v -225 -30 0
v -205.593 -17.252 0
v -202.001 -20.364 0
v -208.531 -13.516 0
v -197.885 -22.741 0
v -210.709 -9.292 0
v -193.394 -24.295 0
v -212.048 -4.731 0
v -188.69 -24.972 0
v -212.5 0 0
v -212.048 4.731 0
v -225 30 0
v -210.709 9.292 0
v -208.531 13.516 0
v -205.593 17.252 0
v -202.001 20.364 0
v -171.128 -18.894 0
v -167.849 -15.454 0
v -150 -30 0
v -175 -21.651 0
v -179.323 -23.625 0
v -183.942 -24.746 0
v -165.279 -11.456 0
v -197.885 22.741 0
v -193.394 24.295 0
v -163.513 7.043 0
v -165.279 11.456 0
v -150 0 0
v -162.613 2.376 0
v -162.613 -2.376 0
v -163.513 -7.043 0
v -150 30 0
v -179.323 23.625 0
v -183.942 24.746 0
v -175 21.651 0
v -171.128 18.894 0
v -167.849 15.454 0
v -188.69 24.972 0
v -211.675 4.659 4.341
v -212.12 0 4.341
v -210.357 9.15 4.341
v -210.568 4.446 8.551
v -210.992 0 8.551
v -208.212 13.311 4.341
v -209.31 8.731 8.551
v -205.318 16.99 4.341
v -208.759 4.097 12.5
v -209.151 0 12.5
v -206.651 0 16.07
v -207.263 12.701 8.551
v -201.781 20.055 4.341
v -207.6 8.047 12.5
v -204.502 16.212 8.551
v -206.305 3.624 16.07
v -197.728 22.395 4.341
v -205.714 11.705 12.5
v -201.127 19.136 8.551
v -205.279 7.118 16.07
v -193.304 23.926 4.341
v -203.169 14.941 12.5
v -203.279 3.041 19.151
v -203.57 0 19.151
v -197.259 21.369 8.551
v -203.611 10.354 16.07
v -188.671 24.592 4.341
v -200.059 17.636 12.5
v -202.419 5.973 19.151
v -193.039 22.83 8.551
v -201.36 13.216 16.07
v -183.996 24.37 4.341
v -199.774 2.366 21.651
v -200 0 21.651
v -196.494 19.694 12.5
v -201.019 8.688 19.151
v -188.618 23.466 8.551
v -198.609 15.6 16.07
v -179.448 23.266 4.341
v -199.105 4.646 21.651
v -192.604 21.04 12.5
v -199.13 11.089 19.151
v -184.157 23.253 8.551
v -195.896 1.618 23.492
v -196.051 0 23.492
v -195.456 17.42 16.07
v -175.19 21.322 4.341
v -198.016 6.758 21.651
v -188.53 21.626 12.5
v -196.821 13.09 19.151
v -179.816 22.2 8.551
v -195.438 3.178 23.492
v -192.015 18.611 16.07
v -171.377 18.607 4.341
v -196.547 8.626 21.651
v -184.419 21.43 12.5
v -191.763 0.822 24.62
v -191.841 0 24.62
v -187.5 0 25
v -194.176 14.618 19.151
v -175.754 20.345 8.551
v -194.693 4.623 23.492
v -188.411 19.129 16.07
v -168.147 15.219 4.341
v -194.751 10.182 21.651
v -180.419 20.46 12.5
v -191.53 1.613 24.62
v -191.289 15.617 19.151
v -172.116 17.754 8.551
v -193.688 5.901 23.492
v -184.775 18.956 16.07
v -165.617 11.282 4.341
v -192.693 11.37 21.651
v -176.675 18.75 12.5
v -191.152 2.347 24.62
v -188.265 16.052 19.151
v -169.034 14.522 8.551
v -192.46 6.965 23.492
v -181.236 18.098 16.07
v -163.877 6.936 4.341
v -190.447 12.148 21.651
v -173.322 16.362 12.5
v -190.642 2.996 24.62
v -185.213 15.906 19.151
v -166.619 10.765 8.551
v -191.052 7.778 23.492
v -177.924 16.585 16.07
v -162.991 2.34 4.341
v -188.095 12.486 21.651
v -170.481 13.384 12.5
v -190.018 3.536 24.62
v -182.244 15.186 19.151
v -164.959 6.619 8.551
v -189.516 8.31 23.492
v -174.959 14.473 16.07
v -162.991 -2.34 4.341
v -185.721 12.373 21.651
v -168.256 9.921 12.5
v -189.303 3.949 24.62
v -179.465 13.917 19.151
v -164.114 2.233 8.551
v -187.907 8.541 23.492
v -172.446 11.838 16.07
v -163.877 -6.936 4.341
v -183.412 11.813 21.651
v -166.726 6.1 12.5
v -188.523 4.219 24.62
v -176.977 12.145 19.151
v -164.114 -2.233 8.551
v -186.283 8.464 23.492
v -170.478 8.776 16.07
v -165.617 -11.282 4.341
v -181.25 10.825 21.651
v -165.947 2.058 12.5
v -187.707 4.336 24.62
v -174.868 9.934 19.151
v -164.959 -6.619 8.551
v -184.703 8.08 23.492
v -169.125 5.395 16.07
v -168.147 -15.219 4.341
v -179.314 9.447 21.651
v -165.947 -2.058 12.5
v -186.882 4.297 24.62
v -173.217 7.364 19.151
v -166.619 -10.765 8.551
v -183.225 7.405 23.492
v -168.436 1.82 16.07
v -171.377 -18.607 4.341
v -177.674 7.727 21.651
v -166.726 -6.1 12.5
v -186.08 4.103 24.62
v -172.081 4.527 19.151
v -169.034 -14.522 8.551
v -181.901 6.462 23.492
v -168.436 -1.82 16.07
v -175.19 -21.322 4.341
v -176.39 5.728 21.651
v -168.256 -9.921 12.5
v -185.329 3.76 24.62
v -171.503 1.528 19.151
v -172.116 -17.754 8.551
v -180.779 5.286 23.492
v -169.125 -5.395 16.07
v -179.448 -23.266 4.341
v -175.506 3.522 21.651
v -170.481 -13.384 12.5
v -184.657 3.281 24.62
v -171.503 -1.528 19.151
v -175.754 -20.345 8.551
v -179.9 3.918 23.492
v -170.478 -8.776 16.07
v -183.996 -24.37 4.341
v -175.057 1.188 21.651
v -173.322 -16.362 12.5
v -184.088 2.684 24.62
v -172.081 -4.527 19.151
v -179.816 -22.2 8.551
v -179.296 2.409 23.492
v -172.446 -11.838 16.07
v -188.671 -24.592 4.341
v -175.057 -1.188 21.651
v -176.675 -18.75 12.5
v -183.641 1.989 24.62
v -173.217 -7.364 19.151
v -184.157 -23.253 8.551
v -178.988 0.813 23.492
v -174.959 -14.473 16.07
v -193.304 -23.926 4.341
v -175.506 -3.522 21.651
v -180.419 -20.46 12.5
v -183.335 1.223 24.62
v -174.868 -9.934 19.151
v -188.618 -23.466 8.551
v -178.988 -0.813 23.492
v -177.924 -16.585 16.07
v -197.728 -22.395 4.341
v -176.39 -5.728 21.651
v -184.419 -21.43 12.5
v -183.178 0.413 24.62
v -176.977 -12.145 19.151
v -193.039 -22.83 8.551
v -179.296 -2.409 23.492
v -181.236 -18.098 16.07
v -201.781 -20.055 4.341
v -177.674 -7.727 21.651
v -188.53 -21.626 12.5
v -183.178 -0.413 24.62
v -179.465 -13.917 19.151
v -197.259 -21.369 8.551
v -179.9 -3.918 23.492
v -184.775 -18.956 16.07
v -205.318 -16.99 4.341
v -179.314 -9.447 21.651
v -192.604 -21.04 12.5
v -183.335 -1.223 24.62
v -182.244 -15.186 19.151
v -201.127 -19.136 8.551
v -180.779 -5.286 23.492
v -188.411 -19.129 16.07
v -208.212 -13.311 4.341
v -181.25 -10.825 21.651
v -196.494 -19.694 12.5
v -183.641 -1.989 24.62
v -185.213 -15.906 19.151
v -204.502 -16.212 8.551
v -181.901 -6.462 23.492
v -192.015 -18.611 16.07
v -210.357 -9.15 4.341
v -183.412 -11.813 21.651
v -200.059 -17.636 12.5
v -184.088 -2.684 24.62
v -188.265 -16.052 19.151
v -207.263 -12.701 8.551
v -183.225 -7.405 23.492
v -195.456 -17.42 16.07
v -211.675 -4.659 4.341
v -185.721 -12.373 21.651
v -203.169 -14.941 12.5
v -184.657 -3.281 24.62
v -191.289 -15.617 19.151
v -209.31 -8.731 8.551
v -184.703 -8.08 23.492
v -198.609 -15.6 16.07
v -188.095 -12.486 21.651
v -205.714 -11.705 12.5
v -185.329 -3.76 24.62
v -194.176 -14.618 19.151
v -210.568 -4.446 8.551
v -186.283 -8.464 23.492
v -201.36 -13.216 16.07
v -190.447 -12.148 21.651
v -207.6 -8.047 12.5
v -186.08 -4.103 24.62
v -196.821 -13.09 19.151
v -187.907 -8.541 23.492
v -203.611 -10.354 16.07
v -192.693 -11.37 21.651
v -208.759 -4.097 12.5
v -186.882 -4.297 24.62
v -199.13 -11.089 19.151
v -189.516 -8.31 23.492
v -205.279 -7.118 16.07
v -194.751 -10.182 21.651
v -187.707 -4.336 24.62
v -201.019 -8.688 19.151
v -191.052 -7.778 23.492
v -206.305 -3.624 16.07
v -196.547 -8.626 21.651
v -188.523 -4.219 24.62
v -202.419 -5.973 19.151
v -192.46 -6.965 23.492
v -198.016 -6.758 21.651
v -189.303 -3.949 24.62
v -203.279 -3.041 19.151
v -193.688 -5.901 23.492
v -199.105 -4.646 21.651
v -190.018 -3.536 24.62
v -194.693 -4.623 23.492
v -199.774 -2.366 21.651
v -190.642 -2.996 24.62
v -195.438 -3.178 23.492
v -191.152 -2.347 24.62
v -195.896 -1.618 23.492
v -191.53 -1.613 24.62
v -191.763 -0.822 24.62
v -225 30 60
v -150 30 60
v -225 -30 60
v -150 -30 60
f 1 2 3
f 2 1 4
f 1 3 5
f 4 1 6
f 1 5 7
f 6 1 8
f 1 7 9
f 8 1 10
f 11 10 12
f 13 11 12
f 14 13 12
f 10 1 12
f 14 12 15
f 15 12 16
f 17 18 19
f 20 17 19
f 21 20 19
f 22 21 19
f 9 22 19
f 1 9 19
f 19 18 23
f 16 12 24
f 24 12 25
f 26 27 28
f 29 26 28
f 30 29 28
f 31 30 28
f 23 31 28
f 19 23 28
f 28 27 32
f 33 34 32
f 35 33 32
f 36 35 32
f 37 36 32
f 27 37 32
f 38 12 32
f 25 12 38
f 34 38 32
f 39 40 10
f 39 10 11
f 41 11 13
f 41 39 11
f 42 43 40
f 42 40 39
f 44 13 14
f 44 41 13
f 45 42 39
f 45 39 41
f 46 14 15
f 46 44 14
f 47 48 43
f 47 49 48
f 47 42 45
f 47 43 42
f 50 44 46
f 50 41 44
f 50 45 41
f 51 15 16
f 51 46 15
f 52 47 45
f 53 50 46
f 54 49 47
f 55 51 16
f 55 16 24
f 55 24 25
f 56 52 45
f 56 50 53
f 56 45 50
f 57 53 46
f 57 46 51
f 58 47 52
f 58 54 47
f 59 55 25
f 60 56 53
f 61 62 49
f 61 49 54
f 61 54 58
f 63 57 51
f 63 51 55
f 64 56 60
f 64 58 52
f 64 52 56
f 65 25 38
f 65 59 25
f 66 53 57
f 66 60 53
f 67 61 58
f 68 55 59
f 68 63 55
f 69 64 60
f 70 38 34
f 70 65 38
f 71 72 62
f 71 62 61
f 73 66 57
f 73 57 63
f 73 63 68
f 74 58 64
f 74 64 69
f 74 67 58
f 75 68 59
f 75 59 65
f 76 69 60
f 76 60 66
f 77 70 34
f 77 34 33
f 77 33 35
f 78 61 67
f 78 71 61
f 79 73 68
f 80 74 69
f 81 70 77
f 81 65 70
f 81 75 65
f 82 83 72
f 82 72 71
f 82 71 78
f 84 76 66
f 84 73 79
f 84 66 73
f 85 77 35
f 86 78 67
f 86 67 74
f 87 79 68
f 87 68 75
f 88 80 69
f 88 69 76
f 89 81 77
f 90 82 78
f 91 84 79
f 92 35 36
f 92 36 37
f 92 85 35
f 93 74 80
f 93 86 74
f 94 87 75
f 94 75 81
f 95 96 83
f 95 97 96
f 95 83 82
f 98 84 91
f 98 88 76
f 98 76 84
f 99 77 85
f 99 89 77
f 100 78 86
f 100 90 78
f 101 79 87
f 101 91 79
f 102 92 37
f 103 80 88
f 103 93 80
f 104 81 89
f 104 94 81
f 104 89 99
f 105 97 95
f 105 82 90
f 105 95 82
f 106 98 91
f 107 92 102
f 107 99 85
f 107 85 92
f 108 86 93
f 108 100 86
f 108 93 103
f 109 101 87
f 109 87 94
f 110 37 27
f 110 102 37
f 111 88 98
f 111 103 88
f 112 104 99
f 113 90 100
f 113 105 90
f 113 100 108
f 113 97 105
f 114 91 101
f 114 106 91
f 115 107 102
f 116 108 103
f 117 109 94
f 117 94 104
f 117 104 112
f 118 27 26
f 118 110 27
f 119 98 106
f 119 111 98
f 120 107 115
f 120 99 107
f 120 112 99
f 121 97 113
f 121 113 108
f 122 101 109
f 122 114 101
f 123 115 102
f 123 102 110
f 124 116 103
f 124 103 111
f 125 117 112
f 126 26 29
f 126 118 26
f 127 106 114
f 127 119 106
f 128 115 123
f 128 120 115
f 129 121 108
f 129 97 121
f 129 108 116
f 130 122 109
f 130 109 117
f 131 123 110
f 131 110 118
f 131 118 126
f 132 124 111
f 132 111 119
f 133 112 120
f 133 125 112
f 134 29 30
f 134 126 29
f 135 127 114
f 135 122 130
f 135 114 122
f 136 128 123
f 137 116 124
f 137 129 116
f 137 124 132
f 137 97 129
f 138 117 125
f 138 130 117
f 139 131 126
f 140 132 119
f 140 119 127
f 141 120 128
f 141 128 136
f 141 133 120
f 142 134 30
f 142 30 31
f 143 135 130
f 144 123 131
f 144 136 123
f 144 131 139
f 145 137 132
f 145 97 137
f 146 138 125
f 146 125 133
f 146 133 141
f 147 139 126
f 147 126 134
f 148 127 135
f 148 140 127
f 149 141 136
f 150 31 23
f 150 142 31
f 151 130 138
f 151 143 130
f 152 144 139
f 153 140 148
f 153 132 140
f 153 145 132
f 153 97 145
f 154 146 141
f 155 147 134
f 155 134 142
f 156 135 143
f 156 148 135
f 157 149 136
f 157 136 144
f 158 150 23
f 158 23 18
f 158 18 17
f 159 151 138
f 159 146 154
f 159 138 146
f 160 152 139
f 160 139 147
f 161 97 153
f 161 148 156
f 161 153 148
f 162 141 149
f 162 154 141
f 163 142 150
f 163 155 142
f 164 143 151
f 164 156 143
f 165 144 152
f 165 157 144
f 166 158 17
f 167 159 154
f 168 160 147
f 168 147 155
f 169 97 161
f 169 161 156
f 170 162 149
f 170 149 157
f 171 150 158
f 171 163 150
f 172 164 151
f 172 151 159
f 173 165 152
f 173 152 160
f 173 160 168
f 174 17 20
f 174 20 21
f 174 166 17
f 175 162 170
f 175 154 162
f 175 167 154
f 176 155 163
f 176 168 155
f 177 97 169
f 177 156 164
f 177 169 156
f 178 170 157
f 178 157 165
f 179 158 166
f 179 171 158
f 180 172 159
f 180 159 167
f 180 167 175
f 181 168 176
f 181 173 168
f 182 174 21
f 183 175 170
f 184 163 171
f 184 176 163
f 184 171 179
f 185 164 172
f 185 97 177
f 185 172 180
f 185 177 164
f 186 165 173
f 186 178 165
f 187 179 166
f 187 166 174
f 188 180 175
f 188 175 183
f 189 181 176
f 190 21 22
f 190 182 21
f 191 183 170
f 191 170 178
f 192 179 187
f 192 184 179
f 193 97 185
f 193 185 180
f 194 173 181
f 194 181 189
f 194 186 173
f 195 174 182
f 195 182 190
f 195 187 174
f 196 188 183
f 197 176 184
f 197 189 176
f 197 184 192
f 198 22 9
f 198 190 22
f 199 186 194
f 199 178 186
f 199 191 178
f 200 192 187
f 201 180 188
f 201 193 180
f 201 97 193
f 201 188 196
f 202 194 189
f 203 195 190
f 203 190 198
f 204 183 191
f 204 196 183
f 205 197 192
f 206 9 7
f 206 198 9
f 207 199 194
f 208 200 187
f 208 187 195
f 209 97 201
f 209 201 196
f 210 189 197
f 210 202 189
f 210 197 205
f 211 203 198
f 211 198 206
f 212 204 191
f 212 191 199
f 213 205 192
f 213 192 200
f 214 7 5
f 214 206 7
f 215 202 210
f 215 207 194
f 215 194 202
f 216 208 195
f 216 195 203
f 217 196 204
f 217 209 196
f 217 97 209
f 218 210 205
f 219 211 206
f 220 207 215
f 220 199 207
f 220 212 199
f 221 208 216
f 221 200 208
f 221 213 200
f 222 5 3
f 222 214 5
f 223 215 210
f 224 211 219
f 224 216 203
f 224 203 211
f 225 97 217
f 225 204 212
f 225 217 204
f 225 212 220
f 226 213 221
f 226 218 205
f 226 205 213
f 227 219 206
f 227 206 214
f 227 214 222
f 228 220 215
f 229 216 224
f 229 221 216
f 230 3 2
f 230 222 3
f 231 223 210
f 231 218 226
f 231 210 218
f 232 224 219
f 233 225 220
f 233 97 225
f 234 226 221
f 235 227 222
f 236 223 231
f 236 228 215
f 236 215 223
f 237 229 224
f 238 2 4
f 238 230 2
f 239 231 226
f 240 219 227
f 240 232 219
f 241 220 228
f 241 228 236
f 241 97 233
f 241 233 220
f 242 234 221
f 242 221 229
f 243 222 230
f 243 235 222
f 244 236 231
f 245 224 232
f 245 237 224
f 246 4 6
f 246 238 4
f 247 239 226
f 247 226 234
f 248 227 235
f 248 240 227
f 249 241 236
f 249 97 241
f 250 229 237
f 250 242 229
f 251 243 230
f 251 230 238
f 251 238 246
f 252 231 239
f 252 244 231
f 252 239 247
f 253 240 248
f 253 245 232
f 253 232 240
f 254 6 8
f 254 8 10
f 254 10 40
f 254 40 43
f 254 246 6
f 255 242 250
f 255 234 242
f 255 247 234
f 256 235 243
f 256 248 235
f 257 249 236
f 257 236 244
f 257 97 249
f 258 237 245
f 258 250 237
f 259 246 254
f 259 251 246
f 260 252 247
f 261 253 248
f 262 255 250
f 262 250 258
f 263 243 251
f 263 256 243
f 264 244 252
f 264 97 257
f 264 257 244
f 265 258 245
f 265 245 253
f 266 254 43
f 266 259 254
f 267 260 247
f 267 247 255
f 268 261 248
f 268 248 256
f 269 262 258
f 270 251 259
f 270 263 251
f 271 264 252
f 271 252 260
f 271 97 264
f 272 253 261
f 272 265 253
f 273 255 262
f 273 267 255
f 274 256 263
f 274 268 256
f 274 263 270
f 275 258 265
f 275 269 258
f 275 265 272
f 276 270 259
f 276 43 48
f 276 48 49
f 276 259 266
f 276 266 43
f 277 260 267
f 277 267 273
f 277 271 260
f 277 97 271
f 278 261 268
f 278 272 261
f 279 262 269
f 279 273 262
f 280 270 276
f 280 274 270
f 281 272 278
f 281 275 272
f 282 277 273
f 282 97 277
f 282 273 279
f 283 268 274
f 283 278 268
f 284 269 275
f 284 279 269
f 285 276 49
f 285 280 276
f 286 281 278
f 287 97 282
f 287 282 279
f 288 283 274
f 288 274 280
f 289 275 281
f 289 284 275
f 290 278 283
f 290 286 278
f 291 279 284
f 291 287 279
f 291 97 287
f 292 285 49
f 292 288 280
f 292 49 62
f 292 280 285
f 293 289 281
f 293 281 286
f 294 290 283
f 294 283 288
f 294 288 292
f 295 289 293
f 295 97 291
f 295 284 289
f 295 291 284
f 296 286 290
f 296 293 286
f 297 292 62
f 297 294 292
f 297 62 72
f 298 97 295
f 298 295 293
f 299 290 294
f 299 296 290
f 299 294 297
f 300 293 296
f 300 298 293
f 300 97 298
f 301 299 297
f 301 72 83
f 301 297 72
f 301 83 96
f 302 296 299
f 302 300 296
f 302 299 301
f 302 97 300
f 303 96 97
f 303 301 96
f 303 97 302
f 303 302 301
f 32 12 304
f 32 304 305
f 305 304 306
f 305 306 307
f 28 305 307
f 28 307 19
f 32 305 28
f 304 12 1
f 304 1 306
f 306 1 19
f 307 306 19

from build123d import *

# Parameters (mm, degrees)
SZKIC1_W                    = 500
SZKIC1_H                    = 60
DODANIE_WYCI_GNI_CIE1_DEPTH = 60
SZKIC2_R                    = 25
WYTNIJ_WYCI_GNI_CIE1_DEPTH  = 25
ZAOKR_GLENIE2_R             = 25
SZKIC5_W                    = 60
SZKIC5_H                    = 60
WYTNIJ_WYCI_GNI_CIE2_DEPTH  = 400
SZKIC6_W                    = 60
SZKIC6_H                    = 60
WYTNIJ_WYCI_GNI_CIE4_DEPTH  = 25


with BuildPart() as part:
    # Szkic1 → Dodanie-wyciągnięcie1 (new body)
    with BuildSketch(Plane.XY):
        Rectangle(SZKIC1_W, SZKIC1_H)
    extrude(amount=DODANIE_WYCI_GNI_CIE1_DEPTH)

    # Szkic2 → Wytnij-wyciągnięcie1 (cut)
    with BuildSketch(Plane(origin=(0, 0, 0), x_dir=(-1, 0, 0), z_dir=(0, 0, -1))):
        with Locations((-187.5, 0)):
            Circle(SZKIC2_R)
        with Locations((-125, 0)):
            Circle(SZKIC2_R)
        with Locations((-62.5, 0)):
            Circle(SZKIC2_R)
        Circle(SZKIC2_R)
        with Locations((62.5, 0)):
            Circle(SZKIC2_R)
        with Locations((125, 0)):
            Circle(SZKIC2_R)
        with Locations((187.5, 0)):
            Circle(SZKIC2_R)
    extrude(amount=-WYTNIJ_WYCI_GNI_CIE1_DEPTH, mode=Mode.SUBTRACT)

    # Zaokrąglenie2
    zaokr_glenie2_edges = [part.edges().sort_by_distance(p)[0] for p in [
        (212.5, 0, 25),
        (150, 0, 25),
        (87.5, 0, 25),
        (25, 0, 25),
        (-37.5, 0, 25),
        (-100, 0, 25),
        (-162.5, 0, 25),
    ]]
    fillet(zaokr_glenie2_edges, radius=ZAOKR_GLENIE2_R - 0.0001)  # a hair under: the kernel refuses the full size

    # Szkic5 → Wytnij-wyciągnięcie2 (cut)
    with BuildSketch(Plane(origin=(250, 0, 0), x_dir=(0, 0, -1), z_dir=(1, 0, 0))):
        with Locations((-30, 0)):
            Rectangle(SZKIC5_W, SZKIC5_H)
    extrude(amount=-WYTNIJ_WYCI_GNI_CIE2_DEPTH, mode=Mode.SUBTRACT)

    # Szkic6 → Wytnij-wyciągnięcie4 (cut)
    with BuildSketch(Plane.ZY.offset(250)):
        with Locations((30, 0)):
            Rectangle(SZKIC6_W, SZKIC6_H)
    extrude(amount=-WYTNIJ_WYCI_GNI_CIE4_DEPTH, mode=Mode.SUBTRACT)


solid = part.part
